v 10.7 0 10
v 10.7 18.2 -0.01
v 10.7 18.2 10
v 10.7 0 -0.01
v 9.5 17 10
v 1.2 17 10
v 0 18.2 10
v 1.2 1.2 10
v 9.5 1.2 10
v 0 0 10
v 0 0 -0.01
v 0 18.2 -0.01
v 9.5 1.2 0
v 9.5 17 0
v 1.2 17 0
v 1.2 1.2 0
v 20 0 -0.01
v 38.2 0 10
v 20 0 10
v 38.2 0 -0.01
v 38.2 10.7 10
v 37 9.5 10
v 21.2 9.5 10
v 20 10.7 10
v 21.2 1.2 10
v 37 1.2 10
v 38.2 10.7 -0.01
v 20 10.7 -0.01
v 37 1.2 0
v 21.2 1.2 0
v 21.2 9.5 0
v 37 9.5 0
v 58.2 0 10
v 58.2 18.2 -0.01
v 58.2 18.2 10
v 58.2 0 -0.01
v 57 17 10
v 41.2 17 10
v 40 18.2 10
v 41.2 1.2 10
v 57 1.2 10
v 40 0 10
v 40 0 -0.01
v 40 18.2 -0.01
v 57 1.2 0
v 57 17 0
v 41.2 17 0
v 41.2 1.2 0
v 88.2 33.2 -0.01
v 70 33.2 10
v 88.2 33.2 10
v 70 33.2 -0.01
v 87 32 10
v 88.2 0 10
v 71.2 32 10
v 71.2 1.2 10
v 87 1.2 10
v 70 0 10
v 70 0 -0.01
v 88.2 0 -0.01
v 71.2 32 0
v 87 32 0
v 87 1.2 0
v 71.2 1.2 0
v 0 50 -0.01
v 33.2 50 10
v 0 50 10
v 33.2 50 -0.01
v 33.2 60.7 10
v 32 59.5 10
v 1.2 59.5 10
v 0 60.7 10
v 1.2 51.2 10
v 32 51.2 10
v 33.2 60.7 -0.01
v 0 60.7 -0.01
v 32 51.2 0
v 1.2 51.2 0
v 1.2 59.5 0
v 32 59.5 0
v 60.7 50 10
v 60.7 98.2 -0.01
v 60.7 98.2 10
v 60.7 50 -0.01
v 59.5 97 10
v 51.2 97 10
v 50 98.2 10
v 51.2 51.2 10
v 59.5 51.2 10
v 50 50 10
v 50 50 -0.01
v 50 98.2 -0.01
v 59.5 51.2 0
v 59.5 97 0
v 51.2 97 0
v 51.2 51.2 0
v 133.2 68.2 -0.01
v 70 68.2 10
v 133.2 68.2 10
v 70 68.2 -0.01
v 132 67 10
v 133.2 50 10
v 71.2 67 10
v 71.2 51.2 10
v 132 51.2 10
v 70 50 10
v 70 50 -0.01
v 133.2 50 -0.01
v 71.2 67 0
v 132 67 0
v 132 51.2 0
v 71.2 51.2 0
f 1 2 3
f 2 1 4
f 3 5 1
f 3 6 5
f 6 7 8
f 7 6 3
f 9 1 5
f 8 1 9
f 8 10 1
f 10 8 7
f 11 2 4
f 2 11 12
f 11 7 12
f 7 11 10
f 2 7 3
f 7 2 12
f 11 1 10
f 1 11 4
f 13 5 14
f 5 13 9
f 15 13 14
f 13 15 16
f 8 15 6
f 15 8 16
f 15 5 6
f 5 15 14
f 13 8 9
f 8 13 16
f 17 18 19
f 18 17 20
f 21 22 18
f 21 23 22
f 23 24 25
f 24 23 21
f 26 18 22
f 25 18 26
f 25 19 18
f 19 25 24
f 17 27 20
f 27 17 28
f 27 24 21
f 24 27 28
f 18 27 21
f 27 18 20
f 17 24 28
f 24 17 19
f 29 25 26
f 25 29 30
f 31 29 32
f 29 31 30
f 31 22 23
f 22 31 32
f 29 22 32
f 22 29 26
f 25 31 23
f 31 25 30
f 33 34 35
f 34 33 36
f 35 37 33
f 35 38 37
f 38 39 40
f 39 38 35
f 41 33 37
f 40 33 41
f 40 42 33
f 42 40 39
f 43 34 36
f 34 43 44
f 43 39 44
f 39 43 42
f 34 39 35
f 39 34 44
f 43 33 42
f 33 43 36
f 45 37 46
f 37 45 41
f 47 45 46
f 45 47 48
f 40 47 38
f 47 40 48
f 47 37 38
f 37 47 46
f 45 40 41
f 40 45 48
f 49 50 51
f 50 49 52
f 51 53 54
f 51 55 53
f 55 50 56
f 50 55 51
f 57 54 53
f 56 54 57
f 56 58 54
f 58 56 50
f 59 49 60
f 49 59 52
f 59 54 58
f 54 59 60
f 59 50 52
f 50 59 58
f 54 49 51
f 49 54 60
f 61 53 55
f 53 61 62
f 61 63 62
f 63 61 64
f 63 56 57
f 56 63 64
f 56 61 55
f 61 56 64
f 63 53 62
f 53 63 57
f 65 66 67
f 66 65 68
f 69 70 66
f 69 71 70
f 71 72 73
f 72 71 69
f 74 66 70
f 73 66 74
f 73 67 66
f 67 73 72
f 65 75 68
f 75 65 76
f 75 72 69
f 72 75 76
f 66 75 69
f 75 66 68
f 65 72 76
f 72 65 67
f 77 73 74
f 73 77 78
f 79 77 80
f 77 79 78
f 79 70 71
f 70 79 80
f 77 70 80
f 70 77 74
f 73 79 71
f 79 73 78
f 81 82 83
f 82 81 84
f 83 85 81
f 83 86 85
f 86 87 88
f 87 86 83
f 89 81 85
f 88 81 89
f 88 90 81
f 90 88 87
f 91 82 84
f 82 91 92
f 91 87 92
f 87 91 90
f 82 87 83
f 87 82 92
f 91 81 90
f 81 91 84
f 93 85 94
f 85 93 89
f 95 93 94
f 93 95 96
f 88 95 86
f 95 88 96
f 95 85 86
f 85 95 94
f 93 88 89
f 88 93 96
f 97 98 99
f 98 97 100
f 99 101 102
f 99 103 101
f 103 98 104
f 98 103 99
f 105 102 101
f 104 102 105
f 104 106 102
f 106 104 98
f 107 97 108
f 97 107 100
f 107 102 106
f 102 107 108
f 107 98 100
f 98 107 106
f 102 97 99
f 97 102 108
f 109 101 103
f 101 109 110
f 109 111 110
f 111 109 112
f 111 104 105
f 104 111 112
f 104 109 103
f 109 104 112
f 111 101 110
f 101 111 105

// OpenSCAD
// file: ../../Base/Boxes.scad
// Fischertechnik Box Foundation
// Pre-designed Boxes

use <Constants.scad>

include <PlacementOptions.scad>

box190Width = 190;
box190Depth = 130;
box130Width = 130;
box130Depth = 95;
boxUsageHeight = 33.9;
boxWallThickness = 2.4;
boxBaseThickness = 1.0;

// getBoxWallThickness()
// Gets the wall thickness of a Fischertechnik Box

function getBoxWallThickness() = boxWallThickness;

// Gets the usable height of a fischertechnik box
function getBoxUsageHeight() = boxUsageHeight;

// Gets the thickness of the Fischertechnik box base.
function getBoxBaseThickness() = boxBaseThickness;

// Gets the usable inner space of a Box 190 as an x/y-list
function getBox190Space() = [
    box190Width - 2*getBoxWallThickness(), 
    box190Depth - 2*getBoxWallThickness() ];

// Imports the Fischertechnik empty box 130x190 mm and places it at position 0,0
// 190x130 are the outer sizes, the inner space is slightly smaller. Use getBox190Space() to get the inner sizes.
// This module needs the STL file "Fischertechnik Box 130x190.stl" in the library path.
// The box is positioned that the usable inner space is at the 0,0,0 position. The

module Box190() {
    translate([-getBoxWallThickness(),-getBoxWallThickness(),-getBoxBaseThickness()])
        import("Fischertechnik Box 130x190.stl", convexity=3);
}

// Gets the usable inner space of a Box 130 as an x/y-list
function getBox130Space() = [
    box130Width - 2*getBoxWallThickness(), 
    box130Depth - 2*getBoxWallThickness() ];

// Imports the Fischertechnik empty box 95x130 mm and places it at position 0,0
// 190x130 are the outer sizes, the inner space is slightly smaller. Use getBox190Space() to get the inner sizes.
// This module needs the STL file "Fischertechnik Box 95x130.stl" in the library path.
// The box is positioned that the usable inner space is at the 0,0,0 position. The

module Box130() {
    translate([-getBoxWallThickness(),-getBoxWallThickness(),-getBoxBaseThickness()])
        import("Fischertechnik Box 95x130.stl", convexity=3);
}

// Creates a web at the specified box walls
// corner 0 = LowerLeft, 1 = UpperLeft, 2 = UpperRight, 3 = LowerRight
// side 0 = LeftOfCorner, 1 = RightOfCorner
// distance = Distance in mm from the corner
// box = inner width and depth of the box (default: Box 190)
// webWidth = length of the web (default is 3 mms)
// webThickness = thickness of the web (default is 1 mm)

module BoxWeb(corner, side, distance, box=getBox190Space(), webWidth=3, webThickness=1.0) {
    sink = getBoxWallThickness()/2;

    width = (corner % 2 == 0) ? 
            (side == LeftOfCorner ? webWidth : webThickness) :
            (side == LeftOfCorner ? webThickness : webWidth);

    depth = (corner % 2 == 0) ? 
            (side == RightOfCorner ? webWidth : webThickness) :
            (side == RightOfCorner ? webThickness : webWidth);
    
    xDiff = corner == LowerLeft ? 
                (side == LeftOfCorner ? -sink : distance) :
            (corner == UpperLeft ?                
                (side == LeftOfCorner ? distance : -sink) :
            (corner == UpperRight ?
                (side == LeftOfCorner ? box.x-webWidth+sink : box.x-distance-webThickness) :
                (side == LeftOfCorner ? box.x-distance-webThickness: box.x-webWidth+sink)));

    yDiff = corner == LowerLeft ? 
                (side == RightOfCorner ? -sink : distance) :
            (corner == UpperLeft ?
                (side == RightOfCorner ? box.y-distance : box.y-webWidth+sink) :
            (corner == UpperRight ?
                (side == RightOfCorner ? box.y-webWidth+sink : box.y-distance) :
                (side == RightOfCorner ? distance : -sink)));
    
    translate([xDiff, yDiff, -getExcess()])
        cube([width, depth, boxUsageHeight + 2*getExcess()]);
}
// file: ../../Base/Rotation.scad
// Fischertechnik Box Foundation
// Geometry Helpers Rotation

include <PlacementOptions.scad>

// getRotatedSpace(space, rotation=NoRotation)
// Rotates the space dependent on the specified rotation

function getRotatedSpace(space, rotation=NoRotation) = [
    (rotation == Rotate90 || rotation == Rotate270) ? space.y : space.x,
    (rotation == Rotate90 || rotation == Rotate270) ? space.x : space.y
];

// Rotates the given space around the fixed left lower corner
// space = the space the children needs as width/depth list [width,depth]
// rotation = 0 Rotate0 degrees, 1 Rotate90 degrees, 2 Rotate180 degrees, 3 Rotate270 degrees (equivalent to -90)

module RotateFix(space, rotation=Rotate0) {
    dy = (rotation == Rotate0 || rotation == Rotate270) ? 0 :
        (rotation == Rotate90) ? space.x :
        space.y;
    dx = (rotation < Rotate180) ? 0 :
        (rotation == Rotate180) ? space.x :
        space.y;
    
    translate([dx, dy, 0])
        rotate([0, 0, rotations[rotation]])
            children();
}
// file: ../../Base/Alignment.scad
// Fischertechnik Box Foundation
// Geometry Helpers Alignment

include <PlacementOptions.scad>

// getAlignedX(elementWidth, spaceWidth, align=AlignRight, offset=0)
// Gets the aligned X offset of an element with the given
// width in the given space.
// elementWidth = The width of the element to positon
// spaceWidth = The space where the element should be aligned
// align = 0 AlignLeft, 1 AlignCenter, 2 AlignRight
// offset = an optional offset from the aligned position. When
// aligned left or centered, then positive values are in X direction.
// When aligned right then positive values are in negative X direction.

function getAlignedX(elementWidth, spaceWidth, align=AlignRight, offset=0) =
    (align == AlignLeft) ?
        offset :
        ((align == AlignCenter) ?
        (spaceWidth - elementWidth)/2 + offset :
        spaceWidth - offset - elementWidth);

// getAlignedY(elementDepth, spaceDepth, align=AlignTop, offset=0)
// Gets the aligned Y offset of an element with the given
// depth in the given space.
// elementDepth = The depth of the element to positon
// spaceDepth = The space where the element should be aligned
// align = 0 AlignBottom, 1 AlignCenter, 2 AlignTop
// offset = an optional offset from the aligned position. When
// aligned bottom or centered, then positive values are in Y direction.
// When aligned top then positive values are in negative Y direction.

function getAlignedY(elementDepth, spaceDepth, align=AlignTop, offset=0) =
    (align == AlignBottom) ?
        offset :
        ((align == AlignCenter) ?
        (spaceDepth - elementDepth)/2 + offset :
        spaceDepth - offset - elementDepth);
// file: ../../Base/Constants.scad
// Fischertechnik Box Foundation
// Constants

// Constant values necessary for multiple elements

// Base constants
dividerThickness = 1.2;
excess = 0.01;
fragments = 90;
tolerance = 0.8;

// Gets the thickness of a divider 
function getDividerThickness() = dividerThickness;

// Gets the excess that is used to merge walls into each other
function getExcess() = excess;

// Gets amount of fragments of a cylinder
function getFragments() = fragments;

// Gets the inner tolerance of a frame to each side
function getTolerance() = tolerance;


// Fischertechnik specific constants
axisDiameter = 4;
axisBottomDiameter = axisDiameter + 1;
standardEdgeDistance = 2.5;
standardWebDistance = 11.5;
standardCornerLength = 15;
tubeWallFactor = 1.6;

// Gets axis diameter
function getAxisDiameter() = axisDiameter;

// Gets axis bottom diameter for thicker part at the bottom
function getAxisBottomDiameter() = axisBottomDiameter;

// gets the standard distance to the wall of the box for dockable frames with webs
function getStandardEdgeDistance() = standardEdgeDistance;

// gets the standard distance of each web to the corner of the dockable frame
function getStandardWebDistance() = standardWebDistance;

// gets the standard length of the corner walls of a dockable frame
function getStandardCornerLength() = standardCornerLength;

// gets the wall thickness of a tube.
function getTubeWallThickness() = tubeWallFactor * getDividerThickness();
// file: ../../Base/PlacementOptions.scad
// Fischertechnik Box Foundation
// Placement Options

// Alignment
NoAlign = 0;
AlignLeft = 1;
AlignBottom = 2;
AlignCenter = 3;
AlignRight = 4;
AlignTop = 5;

// Element rotation degree steps
rotations = [0, -90, -180, -270];

// Rotation
NoRotation = 0;
Rotate0 = 0;
Rotate90 = 1;
Rotate180 = 2;
Rotate270 = 3;

// Docking (seen from above)
NoDock = -1;
DockLeft = 0;
DockTop = 1;
DockRight = 2;
DockCorner = 2;
DockBottom = 3;

// Web corners
LowerLeft = 0;
UpperLeft = 1;
UpperRight = 2;
LowerRight = 3;

// Web position relative to corner
LeftOfCorner = 0;
RightOfCorner = 1;
// file: ../../Elements/FrameSmallBlock.scad
// Fischertechnik Box Library
// Frame for small blocks 5 or 7.5 mm
// 37237 and 37238

use <../ModelBase/Simple.scad>

width = 7.5;
depth = 15;
height = 10;

// getFrameSmallBlockSpace(columns=1, rows=1)
// Gets the space of a frame for columns x rows small parts (7.5 or 5)

function getFrameSmallBlockSpace(columns=1, rows=1) = getFrameOuterVolume([width * columns, depth * rows, height]);

// FrameSmallBlock(columns=1, rows=1)
// frame for columns x rows small parts (7.5 or 5)

module FrameSmallBlock(columns=1, rows=1) {
    Frame([width * columns, depth * rows, height]);
}

// Tests
color("lightgray")
FrameSmallBlock();
// file: ../../Base/Placement.scad
// Fischertechnik Box Foundation
// Geometry Helpers Placement

use <Constants.scad>
use <Alignment.scad>
use <Rotation.scad>
use <Boxes.scad>

include <PlacementOptions.scad>

// Place(x=0, y=0, elementSpace=[0,0], alignX=AlignLeft, alignY=AlignBottom, rotation=Rotate0, boxSpace=getBox190Space())
// Places the child at the specified position
// y = Y-Position. This is a relative position when an X aligment is specified.
// x = X-Position. This is a relative position when an Y aligment is specified.
// elementSpace = space of the element to be placed [x,y]
// alignX = -1=NoAlign, 0 AlignLeft, 1 AlignCenter, 3 AlignRight (elementSpace and boxSpace required!)
// alignY = -1=NoAlign, 2 AlignBottom, 1 AlignCenter, 4 AlignTop (elementSpace and boxSpace required!)
// rotation = 0 Rotate0 0 degrees, 1 Rotate90 90 degrees, 
// 2 Rotate180 180 degrees, 3 Rotate270 270 degrees (equivalent to -90)
// boxSpace = Inner space of the box where the placement occurs [x,y] - default is Box 190x130 inner space

module Place(x=0, y=0, elementSpace=[0,0], 
  alignX=AlignLeft, alignY=AlignBottom, 
  rotation=NoRotation, boxSpace=getBox190Space()) {

    module Position(x, y, space, rotation=Rotate0) {
        translate([x, y, 0])
            RotateFix(space, rotation)
                children(0);
    }

    space = getRotatedSpace(elementSpace, rotation);
    alignedX = getAlignedX(space.x, boxSpace.x, alignX, x);
    alignedY = getAlignedY(space.y, boxSpace.y, alignY, y);
    Position(alignedX, alignedY, elementSpace, rotation)
        children(0);
}

// Center(space=getBox130Space(), elementSpace=[0,0])
// space = Space where the children is centered. For cylinder use centered=true and no elementSpace.
// elementSpace = space of the element to be centered [x,y]

module Center(space=getBox190Space(), elementSpace=[0,0]) {
    translate([(space.x - elementSpace.x) / 2, (space.y - elementSpace.y) / 2])
        children(0);
}

// CenterHorizontal(width=0, y=0, offset=0, space=getBox130Space())
// space = Space where the children is centered. For cylinder use centered=true and no elementSpace.
// elementSpace = space of the element to be centered [x,y]

module CenterHorizontal(width=0, y=0, offset=0, space=getBox190Space()) {
    translate([(space.x - width) / 2 + offset, y])
        children(0);
}

// CenterVertical(depth=0, x=0, offset=0, space=getBox130Space())
// space = Space where the children is centered. For cylinder use centered=true and no elementSpace.
// elementSpace = space of the element to be centered [x,y]

module CenterVerticalal(depth=0, x=0, offset=0, space=getBox190Space()) {
    translate([x, (space.y - depth) / 2 + offset])
        children(0);
}
// main file
// Fischertechnik Box Foundation
// Elements
// Test FrameSmallBlock

use <../../Base/Placement.scad>
use <../../Elements/FrameSmallBlock.scad>

include <../../Base/PlacementOptions.scad>

FrameSmallBlock();

Place(20, 0, getFrameSmallBlockSpace(), rotation=Rotate90)
    FrameSmallBlock();

Place(40, 0)
    FrameSmallBlock(2);

Place(70, 0, getFrameSmallBlockSpace(4), rotation=Rotate270)
    FrameSmallBlock(4);

Place(0, 50, getFrameSmallBlockSpace(rows=2), rotation=Rotate90)
    FrameSmallBlock(rows=2);

Place(50, 50)
    FrameSmallBlock(rows=3);

Place(70, 50, getFrameSmallBlockSpace(2,4), rotation=Rotate270)
    FrameSmallBlock(2,4);
